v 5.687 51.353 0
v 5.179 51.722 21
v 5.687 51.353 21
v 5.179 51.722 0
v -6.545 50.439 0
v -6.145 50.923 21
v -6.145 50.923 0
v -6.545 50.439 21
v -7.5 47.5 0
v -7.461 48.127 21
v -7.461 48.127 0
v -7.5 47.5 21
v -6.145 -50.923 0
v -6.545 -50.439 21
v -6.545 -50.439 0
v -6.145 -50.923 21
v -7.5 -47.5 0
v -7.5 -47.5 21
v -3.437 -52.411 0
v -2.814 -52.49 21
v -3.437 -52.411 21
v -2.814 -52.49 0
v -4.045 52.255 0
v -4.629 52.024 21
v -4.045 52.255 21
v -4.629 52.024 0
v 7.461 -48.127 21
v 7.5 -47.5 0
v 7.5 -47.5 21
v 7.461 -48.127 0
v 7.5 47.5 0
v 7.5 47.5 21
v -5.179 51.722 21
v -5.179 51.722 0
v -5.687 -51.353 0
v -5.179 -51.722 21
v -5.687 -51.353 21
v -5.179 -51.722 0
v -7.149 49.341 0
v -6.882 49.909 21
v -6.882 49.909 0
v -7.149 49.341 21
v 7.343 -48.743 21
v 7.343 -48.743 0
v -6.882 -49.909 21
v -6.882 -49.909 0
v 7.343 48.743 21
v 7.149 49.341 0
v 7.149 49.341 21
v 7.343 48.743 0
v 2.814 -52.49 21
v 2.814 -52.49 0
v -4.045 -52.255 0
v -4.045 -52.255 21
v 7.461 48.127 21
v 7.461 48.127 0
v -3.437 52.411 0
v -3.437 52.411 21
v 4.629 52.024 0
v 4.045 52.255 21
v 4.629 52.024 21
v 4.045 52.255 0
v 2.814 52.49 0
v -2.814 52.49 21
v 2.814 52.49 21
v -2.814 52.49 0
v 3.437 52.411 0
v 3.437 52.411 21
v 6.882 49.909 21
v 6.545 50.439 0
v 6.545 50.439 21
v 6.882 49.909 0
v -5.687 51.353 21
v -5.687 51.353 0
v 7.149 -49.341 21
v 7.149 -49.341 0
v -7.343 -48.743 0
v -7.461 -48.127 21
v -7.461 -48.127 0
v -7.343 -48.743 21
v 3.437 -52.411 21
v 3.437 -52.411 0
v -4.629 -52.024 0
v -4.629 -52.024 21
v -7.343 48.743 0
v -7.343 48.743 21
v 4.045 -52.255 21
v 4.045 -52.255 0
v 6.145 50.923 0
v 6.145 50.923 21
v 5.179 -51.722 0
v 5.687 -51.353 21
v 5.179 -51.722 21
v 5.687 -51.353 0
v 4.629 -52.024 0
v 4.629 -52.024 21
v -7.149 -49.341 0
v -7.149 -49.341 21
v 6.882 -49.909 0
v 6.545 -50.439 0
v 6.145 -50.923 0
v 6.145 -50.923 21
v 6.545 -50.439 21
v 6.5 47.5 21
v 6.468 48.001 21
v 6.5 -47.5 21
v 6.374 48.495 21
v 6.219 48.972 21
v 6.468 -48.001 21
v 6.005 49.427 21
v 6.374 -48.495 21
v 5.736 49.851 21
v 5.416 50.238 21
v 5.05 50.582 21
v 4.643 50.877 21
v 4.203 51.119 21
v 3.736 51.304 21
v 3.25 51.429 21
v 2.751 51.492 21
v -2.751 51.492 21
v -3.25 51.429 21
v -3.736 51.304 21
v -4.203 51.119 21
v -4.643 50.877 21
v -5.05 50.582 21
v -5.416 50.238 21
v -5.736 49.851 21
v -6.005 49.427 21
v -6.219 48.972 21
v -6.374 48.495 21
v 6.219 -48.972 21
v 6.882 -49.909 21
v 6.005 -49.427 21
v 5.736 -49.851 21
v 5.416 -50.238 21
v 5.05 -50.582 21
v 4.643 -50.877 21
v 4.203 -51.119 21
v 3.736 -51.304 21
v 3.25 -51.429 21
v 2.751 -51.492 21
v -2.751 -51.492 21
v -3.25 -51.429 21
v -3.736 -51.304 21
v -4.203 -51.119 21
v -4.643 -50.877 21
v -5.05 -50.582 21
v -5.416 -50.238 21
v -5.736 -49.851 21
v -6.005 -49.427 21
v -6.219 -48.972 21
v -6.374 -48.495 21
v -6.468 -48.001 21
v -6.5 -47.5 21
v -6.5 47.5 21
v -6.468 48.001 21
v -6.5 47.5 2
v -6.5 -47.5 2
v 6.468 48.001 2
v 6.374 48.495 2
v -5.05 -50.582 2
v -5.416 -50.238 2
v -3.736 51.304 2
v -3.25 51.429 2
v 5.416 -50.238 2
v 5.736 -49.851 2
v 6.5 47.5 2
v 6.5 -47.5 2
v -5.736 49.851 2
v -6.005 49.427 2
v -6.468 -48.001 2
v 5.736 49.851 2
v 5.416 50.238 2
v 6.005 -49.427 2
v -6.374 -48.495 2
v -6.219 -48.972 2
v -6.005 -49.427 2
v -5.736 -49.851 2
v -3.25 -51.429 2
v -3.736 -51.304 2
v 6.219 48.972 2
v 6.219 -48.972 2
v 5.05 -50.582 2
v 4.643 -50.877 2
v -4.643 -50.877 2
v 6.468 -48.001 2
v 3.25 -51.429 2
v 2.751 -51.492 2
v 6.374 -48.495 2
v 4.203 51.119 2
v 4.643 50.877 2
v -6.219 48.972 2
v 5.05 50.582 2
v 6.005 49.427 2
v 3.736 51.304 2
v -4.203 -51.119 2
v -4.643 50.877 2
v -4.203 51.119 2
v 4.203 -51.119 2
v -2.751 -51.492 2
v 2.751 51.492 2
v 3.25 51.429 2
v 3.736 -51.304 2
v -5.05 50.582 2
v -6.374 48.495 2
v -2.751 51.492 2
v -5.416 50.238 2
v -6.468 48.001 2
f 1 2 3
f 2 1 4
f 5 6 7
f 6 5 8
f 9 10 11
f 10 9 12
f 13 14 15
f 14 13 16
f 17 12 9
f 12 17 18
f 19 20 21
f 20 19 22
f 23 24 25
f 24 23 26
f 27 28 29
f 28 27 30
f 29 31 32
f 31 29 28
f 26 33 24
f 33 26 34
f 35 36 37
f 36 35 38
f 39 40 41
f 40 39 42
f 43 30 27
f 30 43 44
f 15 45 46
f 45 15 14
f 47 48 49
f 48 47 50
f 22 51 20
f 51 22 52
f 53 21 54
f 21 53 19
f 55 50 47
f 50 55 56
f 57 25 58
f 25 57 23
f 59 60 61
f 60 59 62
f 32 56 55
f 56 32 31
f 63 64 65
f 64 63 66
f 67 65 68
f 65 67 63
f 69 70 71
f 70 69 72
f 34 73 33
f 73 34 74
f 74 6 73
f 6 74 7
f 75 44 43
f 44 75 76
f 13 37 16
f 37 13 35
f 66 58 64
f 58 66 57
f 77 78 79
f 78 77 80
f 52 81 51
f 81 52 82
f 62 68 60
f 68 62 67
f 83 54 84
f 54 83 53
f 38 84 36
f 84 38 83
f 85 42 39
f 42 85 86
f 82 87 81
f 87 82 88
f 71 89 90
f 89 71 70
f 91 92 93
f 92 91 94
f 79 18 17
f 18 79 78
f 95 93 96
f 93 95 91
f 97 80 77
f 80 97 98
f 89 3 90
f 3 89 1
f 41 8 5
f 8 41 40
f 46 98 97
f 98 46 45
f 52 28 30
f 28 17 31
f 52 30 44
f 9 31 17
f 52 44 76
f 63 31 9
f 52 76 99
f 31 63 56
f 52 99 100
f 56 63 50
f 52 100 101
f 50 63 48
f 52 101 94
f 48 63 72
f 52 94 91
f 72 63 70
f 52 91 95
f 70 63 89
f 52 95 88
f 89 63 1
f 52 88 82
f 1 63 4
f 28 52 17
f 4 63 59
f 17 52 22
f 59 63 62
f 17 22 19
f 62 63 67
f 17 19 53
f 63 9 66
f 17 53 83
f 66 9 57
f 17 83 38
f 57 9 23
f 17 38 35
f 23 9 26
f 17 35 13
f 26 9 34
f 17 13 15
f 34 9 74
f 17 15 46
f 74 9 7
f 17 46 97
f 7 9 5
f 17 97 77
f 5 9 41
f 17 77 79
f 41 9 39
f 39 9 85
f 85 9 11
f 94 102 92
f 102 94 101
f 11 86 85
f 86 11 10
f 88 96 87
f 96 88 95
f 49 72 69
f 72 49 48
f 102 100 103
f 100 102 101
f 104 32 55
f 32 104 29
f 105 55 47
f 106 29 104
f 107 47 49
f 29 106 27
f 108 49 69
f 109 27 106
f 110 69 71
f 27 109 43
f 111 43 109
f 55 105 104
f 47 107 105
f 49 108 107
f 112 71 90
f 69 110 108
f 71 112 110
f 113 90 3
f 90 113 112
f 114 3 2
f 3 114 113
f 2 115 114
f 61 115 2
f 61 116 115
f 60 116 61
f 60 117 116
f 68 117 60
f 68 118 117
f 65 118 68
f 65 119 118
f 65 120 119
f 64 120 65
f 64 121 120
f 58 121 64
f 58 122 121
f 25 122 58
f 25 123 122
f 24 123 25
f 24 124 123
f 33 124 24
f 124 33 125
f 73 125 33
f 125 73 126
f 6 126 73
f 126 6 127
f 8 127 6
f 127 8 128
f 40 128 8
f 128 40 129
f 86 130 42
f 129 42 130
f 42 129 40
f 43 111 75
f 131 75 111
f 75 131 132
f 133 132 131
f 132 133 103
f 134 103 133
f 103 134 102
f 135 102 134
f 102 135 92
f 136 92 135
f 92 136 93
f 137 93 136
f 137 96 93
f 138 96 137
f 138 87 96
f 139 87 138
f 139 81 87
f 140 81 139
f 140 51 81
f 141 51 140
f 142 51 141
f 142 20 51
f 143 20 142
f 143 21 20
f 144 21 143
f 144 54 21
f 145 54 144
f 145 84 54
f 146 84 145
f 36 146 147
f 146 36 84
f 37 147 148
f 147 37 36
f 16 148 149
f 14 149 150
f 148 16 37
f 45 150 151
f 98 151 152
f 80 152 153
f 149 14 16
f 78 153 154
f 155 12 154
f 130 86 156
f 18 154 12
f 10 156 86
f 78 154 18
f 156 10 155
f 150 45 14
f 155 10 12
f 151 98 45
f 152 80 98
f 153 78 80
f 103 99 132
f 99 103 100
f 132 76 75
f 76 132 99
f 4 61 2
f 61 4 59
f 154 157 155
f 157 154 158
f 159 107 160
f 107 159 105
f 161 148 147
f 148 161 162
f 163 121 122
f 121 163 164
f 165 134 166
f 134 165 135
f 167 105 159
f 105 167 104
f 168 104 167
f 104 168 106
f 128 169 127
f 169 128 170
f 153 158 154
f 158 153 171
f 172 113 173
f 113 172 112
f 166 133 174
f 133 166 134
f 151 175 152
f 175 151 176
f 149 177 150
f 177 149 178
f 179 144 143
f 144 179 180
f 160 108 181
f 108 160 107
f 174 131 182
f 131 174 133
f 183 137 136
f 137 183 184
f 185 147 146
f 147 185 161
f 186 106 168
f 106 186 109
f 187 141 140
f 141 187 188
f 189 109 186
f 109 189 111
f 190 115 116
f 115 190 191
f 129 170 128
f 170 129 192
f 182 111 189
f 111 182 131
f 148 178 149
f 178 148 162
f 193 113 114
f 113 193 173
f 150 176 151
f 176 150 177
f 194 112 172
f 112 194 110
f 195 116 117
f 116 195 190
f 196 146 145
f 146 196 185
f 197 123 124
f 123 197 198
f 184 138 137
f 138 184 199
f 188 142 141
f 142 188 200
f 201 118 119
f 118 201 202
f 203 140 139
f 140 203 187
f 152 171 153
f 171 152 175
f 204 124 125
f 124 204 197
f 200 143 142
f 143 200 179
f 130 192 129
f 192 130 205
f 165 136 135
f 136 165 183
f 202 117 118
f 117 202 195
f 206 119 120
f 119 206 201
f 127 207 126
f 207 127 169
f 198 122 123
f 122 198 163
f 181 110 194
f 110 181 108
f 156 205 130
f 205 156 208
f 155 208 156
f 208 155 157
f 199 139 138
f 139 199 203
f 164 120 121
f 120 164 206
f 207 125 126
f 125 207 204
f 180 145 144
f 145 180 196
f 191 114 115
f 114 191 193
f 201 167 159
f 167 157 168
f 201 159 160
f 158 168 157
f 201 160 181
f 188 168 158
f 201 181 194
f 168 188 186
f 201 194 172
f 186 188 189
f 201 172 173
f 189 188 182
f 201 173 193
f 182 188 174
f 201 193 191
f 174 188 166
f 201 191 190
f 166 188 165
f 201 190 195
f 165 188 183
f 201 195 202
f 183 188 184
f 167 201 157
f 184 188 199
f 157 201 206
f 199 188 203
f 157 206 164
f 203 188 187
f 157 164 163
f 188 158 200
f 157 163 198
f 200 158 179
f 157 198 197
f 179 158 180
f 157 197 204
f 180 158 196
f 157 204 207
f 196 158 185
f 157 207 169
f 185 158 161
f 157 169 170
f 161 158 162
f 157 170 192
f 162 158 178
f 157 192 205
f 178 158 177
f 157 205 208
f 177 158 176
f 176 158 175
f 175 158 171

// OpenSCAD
$fn = 50;


difference() {
	union() {
		hull() {
			translate(v = [-2.5000000000, 47.5000000000, 0]) {
				cylinder(h = 21, r = 5);
			}
			translate(v = [2.5000000000, 47.5000000000, 0]) {
				cylinder(h = 21, r = 5);
			}
			translate(v = [-2.5000000000, -47.5000000000, 0]) {
				cylinder(h = 21, r = 5);
			}
			translate(v = [2.5000000000, -47.5000000000, 0]) {
				cylinder(h = 21, r = 5);
			}
		}
	}
	union() {
		translate(v = [0, 0, 2]) {
			hull() {
				translate(v = [-2.5000000000, 47.5000000000, 0]) {
					cylinder(h = 19, r = 4);
				}
				translate(v = [2.5000000000, 47.5000000000, 0]) {
					cylinder(h = 19, r = 4);
				}
				translate(v = [-2.5000000000, -47.5000000000, 0]) {
					cylinder(h = 19, r = 4);
				}
				translate(v = [2.5000000000, -47.5000000000, 0]) {
					cylinder(h = 19, r = 4);
				}
			}
		}
	}
}
